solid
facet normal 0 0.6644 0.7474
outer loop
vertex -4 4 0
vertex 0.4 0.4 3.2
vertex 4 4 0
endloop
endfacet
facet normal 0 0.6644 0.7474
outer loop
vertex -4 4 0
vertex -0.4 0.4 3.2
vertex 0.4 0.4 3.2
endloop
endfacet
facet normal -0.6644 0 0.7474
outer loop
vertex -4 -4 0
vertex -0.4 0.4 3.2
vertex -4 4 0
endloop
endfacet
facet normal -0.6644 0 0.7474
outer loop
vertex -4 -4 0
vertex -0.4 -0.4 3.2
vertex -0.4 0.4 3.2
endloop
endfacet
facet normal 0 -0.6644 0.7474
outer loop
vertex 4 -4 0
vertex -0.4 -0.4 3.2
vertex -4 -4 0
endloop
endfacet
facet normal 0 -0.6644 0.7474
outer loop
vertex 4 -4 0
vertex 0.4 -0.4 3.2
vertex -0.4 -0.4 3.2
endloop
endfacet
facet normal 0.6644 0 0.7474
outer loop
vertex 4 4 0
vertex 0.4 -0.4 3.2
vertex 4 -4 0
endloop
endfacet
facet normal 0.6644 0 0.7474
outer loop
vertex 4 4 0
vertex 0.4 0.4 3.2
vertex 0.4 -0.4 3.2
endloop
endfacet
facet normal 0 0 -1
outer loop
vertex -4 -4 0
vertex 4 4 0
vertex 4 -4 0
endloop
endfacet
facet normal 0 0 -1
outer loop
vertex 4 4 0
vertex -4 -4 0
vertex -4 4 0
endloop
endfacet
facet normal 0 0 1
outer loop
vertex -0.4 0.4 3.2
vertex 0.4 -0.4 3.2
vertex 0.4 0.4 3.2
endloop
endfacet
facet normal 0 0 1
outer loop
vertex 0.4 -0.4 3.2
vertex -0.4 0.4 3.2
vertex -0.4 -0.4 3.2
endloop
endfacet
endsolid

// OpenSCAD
// file: pyramid.scad
// studs/pyramid.scad — classic 4-sided pyramid.
// MIT licensed.
//
// Module contract (see CONTRIBUTING.md):
//   stud_pyramid(size, tip_radius, height)
//   - origin at base center, axis along +Z, base on z=0
//
// LEARNING-MODE NOTE: there are three reasonable ways to build a pyramid in
// OpenSCAD. We use `cylinder($fn=4)` because tip_radius drops in cleanly as
// the top radius. Alternatives if you want to revisit:
//   (a) polyhedron with explicit vertices  — most control, no fillet support
//   (b) hull() over a square base and a point — clean, harder to flatten tip
//   (c) minkowski() of (a) with a small sphere — true fillet, slow render

module stud_pyramid(size = 6, tip_radius = 0.4, height = undef) {
    h = is_undef(height) ? size : height;

    // cylinder $fn=4 produces a 4-sided prism. To make the *corners* sit at
    // x=±size/2 and y=±size/2, the base radius must be (size/2)*sqrt(2).
    base_r = (size / 2) * sqrt(2);
    top_r  = tip_radius > 0 ? tip_radius * sqrt(2) : 0;

    rotate([0, 0, 45])
        cylinder(h = h, r1 = base_r, r2 = top_r, $fn = 4);
}

// development render
stud_pyramid(size = 8, tip_radius = 0.4);
// main file
// studs/flat_pyramid.scad — low-profile pyramid for daily wear.
// MIT licensed.
//
// Same geometry as `stud_pyramid` but ~40% of the height — sits closer to
// the band so it doesn't catch on clothing.

use <pyramid.scad>

module stud_flat_pyramid(size = 6, tip_radius = 0.4, height = undef) {
    h = is_undef(height) ? size * 0.4 : height;
    stud_pyramid(size = size, tip_radius = tip_radius, height = h);
}

stud_flat_pyramid(size = 8, tip_radius = 0.4);
